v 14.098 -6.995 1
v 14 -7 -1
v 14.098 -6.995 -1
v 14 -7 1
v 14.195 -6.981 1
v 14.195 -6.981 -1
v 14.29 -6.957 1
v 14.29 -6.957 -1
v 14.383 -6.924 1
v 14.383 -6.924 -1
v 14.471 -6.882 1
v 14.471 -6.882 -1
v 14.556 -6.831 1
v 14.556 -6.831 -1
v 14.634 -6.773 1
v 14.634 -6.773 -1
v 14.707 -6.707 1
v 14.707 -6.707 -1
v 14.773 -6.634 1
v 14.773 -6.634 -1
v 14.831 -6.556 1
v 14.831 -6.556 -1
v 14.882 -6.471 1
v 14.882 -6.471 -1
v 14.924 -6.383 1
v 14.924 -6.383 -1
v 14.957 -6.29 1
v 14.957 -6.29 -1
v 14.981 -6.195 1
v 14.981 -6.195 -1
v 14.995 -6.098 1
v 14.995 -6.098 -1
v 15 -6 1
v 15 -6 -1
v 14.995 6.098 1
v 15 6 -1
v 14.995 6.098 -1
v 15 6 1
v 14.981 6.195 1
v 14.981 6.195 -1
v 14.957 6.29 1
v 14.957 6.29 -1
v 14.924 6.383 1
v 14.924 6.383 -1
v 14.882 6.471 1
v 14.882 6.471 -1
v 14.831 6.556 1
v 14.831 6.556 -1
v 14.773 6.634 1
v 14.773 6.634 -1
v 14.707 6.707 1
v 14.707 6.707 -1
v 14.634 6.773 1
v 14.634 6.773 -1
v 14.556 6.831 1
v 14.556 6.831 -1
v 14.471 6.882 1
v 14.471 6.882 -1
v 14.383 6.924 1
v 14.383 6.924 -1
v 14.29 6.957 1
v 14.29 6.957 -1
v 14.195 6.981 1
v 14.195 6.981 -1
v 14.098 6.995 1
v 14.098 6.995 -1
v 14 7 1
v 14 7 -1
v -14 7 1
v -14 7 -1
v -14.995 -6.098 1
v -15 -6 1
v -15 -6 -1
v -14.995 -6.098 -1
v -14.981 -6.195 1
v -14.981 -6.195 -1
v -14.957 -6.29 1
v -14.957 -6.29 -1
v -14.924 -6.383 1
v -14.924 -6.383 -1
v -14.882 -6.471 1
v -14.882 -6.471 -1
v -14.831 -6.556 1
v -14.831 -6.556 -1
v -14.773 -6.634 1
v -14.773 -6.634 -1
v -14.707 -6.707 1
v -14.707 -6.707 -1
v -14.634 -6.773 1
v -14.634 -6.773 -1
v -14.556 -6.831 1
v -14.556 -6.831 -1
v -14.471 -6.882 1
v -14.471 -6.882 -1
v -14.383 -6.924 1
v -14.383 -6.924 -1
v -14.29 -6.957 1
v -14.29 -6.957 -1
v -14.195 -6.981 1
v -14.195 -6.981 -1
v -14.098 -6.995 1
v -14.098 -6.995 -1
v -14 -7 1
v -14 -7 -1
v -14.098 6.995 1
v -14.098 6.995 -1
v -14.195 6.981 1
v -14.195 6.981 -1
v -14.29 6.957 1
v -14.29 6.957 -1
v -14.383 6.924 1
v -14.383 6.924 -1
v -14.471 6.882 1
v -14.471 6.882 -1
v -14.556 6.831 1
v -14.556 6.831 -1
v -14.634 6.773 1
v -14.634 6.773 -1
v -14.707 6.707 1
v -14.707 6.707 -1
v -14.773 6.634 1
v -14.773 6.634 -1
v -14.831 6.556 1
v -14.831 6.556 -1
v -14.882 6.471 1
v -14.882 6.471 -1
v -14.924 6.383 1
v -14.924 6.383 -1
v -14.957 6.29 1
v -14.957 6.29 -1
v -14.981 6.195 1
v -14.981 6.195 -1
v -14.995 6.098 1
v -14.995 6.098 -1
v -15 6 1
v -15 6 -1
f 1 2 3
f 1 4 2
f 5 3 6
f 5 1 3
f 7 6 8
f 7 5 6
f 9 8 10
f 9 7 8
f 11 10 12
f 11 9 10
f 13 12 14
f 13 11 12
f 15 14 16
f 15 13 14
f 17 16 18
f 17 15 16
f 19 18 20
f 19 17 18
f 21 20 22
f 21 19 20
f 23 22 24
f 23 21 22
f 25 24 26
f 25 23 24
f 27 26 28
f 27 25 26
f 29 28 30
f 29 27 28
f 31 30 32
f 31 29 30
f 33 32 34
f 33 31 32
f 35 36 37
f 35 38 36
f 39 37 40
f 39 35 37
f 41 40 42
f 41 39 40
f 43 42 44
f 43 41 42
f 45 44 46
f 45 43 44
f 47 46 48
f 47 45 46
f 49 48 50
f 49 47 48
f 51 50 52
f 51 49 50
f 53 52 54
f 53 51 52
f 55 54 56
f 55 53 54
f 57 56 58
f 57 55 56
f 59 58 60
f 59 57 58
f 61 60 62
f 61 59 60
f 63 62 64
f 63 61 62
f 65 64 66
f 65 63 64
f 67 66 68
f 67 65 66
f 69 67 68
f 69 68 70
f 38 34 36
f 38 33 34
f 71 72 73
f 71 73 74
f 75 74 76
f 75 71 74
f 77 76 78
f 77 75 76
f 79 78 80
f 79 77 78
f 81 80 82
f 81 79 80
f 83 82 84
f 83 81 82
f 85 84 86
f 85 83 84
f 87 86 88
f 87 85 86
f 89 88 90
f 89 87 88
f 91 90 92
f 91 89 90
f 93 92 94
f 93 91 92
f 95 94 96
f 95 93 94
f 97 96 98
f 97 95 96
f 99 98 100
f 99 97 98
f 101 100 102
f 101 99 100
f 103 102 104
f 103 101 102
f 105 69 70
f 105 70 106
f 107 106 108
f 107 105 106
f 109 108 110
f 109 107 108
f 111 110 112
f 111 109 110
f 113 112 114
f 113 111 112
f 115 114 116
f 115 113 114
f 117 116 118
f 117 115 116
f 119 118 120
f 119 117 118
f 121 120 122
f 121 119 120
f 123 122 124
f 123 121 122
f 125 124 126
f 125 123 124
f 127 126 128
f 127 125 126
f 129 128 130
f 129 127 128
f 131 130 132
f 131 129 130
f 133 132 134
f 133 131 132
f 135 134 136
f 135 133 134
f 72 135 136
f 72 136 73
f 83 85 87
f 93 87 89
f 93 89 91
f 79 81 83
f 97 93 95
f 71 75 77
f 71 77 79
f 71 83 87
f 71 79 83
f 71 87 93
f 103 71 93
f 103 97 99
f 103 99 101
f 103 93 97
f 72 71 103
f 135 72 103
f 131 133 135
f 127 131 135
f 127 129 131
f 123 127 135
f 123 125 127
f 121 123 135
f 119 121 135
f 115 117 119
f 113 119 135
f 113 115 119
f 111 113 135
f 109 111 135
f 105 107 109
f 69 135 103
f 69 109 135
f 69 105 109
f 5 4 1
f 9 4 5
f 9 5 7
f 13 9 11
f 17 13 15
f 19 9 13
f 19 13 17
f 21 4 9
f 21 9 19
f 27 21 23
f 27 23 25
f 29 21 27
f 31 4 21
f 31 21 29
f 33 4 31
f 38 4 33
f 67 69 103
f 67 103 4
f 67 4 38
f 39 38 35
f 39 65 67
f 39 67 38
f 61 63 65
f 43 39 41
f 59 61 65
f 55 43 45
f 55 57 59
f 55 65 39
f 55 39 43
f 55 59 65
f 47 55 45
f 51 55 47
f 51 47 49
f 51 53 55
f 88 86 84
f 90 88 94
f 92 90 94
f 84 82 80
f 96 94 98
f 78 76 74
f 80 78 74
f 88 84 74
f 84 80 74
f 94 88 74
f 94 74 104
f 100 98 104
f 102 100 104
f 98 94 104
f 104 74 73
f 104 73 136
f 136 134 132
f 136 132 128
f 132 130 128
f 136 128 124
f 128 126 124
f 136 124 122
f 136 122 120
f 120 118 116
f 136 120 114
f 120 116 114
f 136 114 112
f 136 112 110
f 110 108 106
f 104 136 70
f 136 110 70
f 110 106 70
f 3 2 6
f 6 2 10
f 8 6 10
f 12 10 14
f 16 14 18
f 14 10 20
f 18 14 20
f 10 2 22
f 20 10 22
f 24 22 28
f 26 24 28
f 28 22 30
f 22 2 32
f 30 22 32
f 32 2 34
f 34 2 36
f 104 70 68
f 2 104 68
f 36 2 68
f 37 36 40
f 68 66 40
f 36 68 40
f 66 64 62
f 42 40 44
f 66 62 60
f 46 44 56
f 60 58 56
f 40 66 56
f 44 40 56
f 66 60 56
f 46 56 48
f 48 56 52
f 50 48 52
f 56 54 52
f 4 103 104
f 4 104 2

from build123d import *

# Parameters (mm, degrees)
F1_DEPTH = 1


with BuildPart() as f1:
    # F0 (on Top) → F1 (new body, symmetric)
    with BuildSketch(Plane.XY):
        with BuildLine():
            ThreePointArc((15, 6), (14.7071067812, 6.7071067812), (14, 7))
            Line((14, 7), (-14, 7))
            ThreePointArc((-14, 7), (-14.7071067812, 6.7071067812), (-15, 6))
            Line((-15, 6), (-15, -6))
            ThreePointArc((-15, -6), (-14.7071067812, -6.7071067812), (-14, -7))
            Line((-14, -7), (14, -7))
            ThreePointArc((14, -7), (14.7071067812, -6.7071067812), (15, -6))
            Line((15, -6), (15, 6))
        make_face()
    extrude(amount=F1_DEPTH, both=True)


solid = f1.part
